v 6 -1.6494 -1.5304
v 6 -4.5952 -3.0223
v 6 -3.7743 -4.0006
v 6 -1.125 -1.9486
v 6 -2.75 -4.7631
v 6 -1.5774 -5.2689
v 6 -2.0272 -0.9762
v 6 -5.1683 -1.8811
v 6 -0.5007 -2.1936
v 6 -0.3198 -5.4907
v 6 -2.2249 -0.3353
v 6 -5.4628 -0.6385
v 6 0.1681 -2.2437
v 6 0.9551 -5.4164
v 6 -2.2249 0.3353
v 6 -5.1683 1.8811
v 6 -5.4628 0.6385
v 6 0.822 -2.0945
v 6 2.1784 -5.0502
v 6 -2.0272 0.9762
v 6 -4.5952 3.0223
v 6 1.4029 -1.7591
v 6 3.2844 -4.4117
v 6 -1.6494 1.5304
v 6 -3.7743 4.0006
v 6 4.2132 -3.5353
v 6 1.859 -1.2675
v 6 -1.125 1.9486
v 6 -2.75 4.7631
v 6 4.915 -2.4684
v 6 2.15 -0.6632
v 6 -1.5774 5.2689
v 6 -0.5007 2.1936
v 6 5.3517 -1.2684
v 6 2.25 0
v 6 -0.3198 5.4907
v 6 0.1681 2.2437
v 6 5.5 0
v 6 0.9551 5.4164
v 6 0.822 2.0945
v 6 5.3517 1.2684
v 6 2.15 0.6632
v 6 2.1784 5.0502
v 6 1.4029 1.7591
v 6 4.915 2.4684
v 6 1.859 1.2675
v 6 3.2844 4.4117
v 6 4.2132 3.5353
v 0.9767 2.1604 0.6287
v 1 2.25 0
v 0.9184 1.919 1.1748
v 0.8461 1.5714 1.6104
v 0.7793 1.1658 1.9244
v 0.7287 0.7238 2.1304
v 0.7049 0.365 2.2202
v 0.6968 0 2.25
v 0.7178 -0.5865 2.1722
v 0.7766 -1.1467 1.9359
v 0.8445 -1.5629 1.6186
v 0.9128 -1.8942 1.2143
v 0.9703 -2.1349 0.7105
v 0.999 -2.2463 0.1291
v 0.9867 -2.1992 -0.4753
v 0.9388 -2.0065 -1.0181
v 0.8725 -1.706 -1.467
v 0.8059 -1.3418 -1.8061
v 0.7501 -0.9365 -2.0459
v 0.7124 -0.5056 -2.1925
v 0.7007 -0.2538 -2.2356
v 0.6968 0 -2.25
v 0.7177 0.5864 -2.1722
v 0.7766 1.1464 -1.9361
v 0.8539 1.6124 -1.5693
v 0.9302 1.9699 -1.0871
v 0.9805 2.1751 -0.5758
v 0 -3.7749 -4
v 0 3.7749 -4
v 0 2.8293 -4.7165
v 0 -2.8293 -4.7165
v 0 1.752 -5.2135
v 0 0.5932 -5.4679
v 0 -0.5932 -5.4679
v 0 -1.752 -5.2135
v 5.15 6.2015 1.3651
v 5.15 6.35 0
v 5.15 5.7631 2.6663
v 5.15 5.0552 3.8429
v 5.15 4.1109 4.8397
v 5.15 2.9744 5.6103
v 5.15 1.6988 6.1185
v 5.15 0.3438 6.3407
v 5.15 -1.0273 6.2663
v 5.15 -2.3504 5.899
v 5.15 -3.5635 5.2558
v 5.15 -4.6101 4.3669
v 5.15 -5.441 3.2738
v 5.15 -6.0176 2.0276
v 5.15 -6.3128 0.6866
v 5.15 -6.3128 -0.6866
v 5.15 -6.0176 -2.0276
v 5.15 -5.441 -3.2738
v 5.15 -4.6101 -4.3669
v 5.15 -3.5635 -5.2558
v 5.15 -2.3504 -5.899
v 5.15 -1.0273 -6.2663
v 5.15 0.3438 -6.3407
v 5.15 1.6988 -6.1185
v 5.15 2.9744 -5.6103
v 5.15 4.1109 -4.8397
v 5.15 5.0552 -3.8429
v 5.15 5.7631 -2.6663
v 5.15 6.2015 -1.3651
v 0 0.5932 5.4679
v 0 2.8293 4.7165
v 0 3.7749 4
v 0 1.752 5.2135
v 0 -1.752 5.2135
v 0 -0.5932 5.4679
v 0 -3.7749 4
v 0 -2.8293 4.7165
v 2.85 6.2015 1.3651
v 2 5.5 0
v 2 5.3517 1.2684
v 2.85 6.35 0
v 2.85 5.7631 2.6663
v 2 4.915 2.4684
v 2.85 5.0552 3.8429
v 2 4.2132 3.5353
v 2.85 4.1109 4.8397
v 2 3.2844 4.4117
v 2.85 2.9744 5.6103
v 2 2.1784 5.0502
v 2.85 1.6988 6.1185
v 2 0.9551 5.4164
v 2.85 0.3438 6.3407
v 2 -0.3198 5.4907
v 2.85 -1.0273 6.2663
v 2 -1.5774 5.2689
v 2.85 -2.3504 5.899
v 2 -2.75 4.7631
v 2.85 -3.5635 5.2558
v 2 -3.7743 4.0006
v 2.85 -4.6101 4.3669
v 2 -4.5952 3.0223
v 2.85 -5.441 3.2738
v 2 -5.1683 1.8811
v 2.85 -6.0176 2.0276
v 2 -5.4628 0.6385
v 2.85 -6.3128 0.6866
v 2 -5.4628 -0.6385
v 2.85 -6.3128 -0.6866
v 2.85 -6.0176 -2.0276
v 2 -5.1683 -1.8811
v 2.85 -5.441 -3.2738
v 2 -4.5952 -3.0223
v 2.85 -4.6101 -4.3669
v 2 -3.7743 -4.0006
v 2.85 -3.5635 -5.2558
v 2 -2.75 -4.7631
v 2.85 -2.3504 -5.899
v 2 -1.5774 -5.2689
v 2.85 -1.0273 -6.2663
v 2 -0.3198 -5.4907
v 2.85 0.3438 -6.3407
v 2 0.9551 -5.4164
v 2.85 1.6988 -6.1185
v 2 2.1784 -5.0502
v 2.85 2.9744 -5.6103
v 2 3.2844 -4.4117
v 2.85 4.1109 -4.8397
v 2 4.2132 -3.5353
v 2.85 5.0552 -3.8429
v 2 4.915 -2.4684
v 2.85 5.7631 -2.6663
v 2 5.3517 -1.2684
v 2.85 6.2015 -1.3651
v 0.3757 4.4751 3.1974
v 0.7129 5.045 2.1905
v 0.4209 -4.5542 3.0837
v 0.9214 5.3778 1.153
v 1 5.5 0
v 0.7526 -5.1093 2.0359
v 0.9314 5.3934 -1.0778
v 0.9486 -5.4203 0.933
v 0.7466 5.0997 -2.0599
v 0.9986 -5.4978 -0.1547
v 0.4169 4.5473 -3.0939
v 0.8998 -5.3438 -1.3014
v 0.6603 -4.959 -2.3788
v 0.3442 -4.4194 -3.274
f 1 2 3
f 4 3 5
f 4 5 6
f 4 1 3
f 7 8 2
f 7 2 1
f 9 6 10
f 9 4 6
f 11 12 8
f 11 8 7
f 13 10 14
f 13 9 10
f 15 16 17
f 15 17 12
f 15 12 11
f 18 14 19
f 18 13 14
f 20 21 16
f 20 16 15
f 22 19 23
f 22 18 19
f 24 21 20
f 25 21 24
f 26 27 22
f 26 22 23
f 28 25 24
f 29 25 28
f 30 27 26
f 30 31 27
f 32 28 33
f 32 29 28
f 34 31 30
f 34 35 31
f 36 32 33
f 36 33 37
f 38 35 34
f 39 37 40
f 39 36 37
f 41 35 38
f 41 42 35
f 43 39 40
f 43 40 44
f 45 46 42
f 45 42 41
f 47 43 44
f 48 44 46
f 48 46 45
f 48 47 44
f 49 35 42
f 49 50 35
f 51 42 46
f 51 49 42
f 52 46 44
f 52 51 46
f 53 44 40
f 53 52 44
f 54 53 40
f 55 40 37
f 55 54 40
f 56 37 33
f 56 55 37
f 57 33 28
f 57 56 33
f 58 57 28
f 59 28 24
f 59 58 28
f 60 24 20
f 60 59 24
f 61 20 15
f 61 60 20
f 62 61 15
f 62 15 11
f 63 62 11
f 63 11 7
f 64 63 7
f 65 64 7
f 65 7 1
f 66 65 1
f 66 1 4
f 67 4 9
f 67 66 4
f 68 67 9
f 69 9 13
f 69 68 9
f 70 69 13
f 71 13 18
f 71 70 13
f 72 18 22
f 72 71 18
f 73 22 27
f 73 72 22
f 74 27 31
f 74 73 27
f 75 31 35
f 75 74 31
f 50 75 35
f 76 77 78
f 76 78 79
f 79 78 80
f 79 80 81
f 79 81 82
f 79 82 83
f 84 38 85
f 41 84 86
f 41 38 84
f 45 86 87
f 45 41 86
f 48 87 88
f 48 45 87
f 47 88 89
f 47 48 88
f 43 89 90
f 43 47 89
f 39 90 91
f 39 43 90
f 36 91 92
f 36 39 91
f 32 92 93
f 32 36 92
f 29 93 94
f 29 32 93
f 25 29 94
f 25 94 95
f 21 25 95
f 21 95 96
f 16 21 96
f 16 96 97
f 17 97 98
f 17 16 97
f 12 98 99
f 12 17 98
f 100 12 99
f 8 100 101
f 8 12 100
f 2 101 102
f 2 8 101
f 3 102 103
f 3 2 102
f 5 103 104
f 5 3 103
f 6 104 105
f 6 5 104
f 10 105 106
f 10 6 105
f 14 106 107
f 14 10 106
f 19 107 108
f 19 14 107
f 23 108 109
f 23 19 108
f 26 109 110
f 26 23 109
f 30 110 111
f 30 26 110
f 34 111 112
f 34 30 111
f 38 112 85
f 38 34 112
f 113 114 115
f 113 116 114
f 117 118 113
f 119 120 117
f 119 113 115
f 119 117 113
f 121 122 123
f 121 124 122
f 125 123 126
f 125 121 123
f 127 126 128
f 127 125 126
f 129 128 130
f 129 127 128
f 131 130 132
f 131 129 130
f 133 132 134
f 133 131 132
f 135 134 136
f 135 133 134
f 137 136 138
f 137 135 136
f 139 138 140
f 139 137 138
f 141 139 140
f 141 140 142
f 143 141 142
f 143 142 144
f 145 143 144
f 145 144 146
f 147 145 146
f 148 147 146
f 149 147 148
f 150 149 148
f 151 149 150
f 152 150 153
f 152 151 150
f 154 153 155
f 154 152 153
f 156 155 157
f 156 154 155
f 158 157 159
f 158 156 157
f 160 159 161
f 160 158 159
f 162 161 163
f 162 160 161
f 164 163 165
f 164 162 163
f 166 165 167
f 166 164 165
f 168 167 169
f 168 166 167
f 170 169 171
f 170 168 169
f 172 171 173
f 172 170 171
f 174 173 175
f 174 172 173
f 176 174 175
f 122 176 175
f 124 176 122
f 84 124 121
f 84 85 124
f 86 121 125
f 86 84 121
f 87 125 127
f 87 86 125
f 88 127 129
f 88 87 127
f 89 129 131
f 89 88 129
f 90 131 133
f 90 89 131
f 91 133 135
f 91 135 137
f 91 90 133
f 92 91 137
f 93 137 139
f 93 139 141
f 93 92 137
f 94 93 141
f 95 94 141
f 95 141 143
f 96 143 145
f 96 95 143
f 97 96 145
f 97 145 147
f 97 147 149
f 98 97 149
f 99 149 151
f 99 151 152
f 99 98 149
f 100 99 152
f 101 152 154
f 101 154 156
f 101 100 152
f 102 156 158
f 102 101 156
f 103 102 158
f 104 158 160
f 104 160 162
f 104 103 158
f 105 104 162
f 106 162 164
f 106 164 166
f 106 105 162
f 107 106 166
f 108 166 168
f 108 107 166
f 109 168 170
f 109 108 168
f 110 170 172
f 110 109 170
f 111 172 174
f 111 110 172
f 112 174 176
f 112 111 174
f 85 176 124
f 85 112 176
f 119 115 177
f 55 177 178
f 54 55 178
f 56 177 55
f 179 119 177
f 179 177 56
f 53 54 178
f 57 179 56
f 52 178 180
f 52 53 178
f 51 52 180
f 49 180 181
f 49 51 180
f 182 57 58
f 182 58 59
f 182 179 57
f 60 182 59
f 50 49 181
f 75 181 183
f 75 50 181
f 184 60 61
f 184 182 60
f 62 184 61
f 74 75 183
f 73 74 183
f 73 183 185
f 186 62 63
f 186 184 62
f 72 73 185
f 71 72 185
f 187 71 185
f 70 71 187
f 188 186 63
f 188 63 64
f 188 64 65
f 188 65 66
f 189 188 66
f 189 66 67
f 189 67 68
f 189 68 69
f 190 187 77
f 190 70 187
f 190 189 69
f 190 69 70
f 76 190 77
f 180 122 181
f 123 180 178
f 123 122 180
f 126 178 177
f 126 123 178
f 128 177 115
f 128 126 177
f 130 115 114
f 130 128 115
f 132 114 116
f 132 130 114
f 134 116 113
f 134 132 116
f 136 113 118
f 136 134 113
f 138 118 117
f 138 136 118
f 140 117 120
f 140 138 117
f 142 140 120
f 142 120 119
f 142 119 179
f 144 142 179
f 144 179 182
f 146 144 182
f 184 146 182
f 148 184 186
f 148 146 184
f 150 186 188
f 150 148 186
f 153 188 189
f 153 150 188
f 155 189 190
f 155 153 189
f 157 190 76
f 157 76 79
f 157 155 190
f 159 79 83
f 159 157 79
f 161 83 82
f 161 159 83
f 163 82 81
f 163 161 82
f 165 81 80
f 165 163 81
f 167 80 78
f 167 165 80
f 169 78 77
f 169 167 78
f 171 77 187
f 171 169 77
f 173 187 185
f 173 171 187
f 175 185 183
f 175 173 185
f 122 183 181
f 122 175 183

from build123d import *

# Parameters (mm, degrees)
ESBO_O2_R                  = 8.5
CORTE_EXTRUS_O1_DEPTH      = 7.35
CORTE_EXTRUS_O1_DEPTH_BACK = 7.35


with BuildPart() as part:
    # Esboço1 → Revolução1 (revolve)
    with BuildSketch(Plane.XY):
        Polygon((0, 5.5), (2, 5.5), (2.85, 6.35), (5.15, 6.35), (6, 5.5), (6, 2.25), (0.692820323, 2.25), (0, 2.65), align=None)
    revolve(axis=Axis((14.266397253, 0, 0), (1, 0, 0)))

    # Esboço2 → Corte-extrusão1 (cut, two sides)
    with BuildSketch(Plane(origin=(0, 0, 0), x_dir=(1, 0, 0), z_dir=(0, 1, 0))) as corte_extrus_o1_sk:
        with Locations((-7.5, 0)):
            Circle(ESBO_O2_R)
    extrude(amount=CORTE_EXTRUS_O1_DEPTH, mode=Mode.SUBTRACT)
    extrude(corte_extrus_o1_sk.sketch, amount=-CORTE_EXTRUS_O1_DEPTH_BACK, mode=Mode.SUBTRACT)


solid = part.part
